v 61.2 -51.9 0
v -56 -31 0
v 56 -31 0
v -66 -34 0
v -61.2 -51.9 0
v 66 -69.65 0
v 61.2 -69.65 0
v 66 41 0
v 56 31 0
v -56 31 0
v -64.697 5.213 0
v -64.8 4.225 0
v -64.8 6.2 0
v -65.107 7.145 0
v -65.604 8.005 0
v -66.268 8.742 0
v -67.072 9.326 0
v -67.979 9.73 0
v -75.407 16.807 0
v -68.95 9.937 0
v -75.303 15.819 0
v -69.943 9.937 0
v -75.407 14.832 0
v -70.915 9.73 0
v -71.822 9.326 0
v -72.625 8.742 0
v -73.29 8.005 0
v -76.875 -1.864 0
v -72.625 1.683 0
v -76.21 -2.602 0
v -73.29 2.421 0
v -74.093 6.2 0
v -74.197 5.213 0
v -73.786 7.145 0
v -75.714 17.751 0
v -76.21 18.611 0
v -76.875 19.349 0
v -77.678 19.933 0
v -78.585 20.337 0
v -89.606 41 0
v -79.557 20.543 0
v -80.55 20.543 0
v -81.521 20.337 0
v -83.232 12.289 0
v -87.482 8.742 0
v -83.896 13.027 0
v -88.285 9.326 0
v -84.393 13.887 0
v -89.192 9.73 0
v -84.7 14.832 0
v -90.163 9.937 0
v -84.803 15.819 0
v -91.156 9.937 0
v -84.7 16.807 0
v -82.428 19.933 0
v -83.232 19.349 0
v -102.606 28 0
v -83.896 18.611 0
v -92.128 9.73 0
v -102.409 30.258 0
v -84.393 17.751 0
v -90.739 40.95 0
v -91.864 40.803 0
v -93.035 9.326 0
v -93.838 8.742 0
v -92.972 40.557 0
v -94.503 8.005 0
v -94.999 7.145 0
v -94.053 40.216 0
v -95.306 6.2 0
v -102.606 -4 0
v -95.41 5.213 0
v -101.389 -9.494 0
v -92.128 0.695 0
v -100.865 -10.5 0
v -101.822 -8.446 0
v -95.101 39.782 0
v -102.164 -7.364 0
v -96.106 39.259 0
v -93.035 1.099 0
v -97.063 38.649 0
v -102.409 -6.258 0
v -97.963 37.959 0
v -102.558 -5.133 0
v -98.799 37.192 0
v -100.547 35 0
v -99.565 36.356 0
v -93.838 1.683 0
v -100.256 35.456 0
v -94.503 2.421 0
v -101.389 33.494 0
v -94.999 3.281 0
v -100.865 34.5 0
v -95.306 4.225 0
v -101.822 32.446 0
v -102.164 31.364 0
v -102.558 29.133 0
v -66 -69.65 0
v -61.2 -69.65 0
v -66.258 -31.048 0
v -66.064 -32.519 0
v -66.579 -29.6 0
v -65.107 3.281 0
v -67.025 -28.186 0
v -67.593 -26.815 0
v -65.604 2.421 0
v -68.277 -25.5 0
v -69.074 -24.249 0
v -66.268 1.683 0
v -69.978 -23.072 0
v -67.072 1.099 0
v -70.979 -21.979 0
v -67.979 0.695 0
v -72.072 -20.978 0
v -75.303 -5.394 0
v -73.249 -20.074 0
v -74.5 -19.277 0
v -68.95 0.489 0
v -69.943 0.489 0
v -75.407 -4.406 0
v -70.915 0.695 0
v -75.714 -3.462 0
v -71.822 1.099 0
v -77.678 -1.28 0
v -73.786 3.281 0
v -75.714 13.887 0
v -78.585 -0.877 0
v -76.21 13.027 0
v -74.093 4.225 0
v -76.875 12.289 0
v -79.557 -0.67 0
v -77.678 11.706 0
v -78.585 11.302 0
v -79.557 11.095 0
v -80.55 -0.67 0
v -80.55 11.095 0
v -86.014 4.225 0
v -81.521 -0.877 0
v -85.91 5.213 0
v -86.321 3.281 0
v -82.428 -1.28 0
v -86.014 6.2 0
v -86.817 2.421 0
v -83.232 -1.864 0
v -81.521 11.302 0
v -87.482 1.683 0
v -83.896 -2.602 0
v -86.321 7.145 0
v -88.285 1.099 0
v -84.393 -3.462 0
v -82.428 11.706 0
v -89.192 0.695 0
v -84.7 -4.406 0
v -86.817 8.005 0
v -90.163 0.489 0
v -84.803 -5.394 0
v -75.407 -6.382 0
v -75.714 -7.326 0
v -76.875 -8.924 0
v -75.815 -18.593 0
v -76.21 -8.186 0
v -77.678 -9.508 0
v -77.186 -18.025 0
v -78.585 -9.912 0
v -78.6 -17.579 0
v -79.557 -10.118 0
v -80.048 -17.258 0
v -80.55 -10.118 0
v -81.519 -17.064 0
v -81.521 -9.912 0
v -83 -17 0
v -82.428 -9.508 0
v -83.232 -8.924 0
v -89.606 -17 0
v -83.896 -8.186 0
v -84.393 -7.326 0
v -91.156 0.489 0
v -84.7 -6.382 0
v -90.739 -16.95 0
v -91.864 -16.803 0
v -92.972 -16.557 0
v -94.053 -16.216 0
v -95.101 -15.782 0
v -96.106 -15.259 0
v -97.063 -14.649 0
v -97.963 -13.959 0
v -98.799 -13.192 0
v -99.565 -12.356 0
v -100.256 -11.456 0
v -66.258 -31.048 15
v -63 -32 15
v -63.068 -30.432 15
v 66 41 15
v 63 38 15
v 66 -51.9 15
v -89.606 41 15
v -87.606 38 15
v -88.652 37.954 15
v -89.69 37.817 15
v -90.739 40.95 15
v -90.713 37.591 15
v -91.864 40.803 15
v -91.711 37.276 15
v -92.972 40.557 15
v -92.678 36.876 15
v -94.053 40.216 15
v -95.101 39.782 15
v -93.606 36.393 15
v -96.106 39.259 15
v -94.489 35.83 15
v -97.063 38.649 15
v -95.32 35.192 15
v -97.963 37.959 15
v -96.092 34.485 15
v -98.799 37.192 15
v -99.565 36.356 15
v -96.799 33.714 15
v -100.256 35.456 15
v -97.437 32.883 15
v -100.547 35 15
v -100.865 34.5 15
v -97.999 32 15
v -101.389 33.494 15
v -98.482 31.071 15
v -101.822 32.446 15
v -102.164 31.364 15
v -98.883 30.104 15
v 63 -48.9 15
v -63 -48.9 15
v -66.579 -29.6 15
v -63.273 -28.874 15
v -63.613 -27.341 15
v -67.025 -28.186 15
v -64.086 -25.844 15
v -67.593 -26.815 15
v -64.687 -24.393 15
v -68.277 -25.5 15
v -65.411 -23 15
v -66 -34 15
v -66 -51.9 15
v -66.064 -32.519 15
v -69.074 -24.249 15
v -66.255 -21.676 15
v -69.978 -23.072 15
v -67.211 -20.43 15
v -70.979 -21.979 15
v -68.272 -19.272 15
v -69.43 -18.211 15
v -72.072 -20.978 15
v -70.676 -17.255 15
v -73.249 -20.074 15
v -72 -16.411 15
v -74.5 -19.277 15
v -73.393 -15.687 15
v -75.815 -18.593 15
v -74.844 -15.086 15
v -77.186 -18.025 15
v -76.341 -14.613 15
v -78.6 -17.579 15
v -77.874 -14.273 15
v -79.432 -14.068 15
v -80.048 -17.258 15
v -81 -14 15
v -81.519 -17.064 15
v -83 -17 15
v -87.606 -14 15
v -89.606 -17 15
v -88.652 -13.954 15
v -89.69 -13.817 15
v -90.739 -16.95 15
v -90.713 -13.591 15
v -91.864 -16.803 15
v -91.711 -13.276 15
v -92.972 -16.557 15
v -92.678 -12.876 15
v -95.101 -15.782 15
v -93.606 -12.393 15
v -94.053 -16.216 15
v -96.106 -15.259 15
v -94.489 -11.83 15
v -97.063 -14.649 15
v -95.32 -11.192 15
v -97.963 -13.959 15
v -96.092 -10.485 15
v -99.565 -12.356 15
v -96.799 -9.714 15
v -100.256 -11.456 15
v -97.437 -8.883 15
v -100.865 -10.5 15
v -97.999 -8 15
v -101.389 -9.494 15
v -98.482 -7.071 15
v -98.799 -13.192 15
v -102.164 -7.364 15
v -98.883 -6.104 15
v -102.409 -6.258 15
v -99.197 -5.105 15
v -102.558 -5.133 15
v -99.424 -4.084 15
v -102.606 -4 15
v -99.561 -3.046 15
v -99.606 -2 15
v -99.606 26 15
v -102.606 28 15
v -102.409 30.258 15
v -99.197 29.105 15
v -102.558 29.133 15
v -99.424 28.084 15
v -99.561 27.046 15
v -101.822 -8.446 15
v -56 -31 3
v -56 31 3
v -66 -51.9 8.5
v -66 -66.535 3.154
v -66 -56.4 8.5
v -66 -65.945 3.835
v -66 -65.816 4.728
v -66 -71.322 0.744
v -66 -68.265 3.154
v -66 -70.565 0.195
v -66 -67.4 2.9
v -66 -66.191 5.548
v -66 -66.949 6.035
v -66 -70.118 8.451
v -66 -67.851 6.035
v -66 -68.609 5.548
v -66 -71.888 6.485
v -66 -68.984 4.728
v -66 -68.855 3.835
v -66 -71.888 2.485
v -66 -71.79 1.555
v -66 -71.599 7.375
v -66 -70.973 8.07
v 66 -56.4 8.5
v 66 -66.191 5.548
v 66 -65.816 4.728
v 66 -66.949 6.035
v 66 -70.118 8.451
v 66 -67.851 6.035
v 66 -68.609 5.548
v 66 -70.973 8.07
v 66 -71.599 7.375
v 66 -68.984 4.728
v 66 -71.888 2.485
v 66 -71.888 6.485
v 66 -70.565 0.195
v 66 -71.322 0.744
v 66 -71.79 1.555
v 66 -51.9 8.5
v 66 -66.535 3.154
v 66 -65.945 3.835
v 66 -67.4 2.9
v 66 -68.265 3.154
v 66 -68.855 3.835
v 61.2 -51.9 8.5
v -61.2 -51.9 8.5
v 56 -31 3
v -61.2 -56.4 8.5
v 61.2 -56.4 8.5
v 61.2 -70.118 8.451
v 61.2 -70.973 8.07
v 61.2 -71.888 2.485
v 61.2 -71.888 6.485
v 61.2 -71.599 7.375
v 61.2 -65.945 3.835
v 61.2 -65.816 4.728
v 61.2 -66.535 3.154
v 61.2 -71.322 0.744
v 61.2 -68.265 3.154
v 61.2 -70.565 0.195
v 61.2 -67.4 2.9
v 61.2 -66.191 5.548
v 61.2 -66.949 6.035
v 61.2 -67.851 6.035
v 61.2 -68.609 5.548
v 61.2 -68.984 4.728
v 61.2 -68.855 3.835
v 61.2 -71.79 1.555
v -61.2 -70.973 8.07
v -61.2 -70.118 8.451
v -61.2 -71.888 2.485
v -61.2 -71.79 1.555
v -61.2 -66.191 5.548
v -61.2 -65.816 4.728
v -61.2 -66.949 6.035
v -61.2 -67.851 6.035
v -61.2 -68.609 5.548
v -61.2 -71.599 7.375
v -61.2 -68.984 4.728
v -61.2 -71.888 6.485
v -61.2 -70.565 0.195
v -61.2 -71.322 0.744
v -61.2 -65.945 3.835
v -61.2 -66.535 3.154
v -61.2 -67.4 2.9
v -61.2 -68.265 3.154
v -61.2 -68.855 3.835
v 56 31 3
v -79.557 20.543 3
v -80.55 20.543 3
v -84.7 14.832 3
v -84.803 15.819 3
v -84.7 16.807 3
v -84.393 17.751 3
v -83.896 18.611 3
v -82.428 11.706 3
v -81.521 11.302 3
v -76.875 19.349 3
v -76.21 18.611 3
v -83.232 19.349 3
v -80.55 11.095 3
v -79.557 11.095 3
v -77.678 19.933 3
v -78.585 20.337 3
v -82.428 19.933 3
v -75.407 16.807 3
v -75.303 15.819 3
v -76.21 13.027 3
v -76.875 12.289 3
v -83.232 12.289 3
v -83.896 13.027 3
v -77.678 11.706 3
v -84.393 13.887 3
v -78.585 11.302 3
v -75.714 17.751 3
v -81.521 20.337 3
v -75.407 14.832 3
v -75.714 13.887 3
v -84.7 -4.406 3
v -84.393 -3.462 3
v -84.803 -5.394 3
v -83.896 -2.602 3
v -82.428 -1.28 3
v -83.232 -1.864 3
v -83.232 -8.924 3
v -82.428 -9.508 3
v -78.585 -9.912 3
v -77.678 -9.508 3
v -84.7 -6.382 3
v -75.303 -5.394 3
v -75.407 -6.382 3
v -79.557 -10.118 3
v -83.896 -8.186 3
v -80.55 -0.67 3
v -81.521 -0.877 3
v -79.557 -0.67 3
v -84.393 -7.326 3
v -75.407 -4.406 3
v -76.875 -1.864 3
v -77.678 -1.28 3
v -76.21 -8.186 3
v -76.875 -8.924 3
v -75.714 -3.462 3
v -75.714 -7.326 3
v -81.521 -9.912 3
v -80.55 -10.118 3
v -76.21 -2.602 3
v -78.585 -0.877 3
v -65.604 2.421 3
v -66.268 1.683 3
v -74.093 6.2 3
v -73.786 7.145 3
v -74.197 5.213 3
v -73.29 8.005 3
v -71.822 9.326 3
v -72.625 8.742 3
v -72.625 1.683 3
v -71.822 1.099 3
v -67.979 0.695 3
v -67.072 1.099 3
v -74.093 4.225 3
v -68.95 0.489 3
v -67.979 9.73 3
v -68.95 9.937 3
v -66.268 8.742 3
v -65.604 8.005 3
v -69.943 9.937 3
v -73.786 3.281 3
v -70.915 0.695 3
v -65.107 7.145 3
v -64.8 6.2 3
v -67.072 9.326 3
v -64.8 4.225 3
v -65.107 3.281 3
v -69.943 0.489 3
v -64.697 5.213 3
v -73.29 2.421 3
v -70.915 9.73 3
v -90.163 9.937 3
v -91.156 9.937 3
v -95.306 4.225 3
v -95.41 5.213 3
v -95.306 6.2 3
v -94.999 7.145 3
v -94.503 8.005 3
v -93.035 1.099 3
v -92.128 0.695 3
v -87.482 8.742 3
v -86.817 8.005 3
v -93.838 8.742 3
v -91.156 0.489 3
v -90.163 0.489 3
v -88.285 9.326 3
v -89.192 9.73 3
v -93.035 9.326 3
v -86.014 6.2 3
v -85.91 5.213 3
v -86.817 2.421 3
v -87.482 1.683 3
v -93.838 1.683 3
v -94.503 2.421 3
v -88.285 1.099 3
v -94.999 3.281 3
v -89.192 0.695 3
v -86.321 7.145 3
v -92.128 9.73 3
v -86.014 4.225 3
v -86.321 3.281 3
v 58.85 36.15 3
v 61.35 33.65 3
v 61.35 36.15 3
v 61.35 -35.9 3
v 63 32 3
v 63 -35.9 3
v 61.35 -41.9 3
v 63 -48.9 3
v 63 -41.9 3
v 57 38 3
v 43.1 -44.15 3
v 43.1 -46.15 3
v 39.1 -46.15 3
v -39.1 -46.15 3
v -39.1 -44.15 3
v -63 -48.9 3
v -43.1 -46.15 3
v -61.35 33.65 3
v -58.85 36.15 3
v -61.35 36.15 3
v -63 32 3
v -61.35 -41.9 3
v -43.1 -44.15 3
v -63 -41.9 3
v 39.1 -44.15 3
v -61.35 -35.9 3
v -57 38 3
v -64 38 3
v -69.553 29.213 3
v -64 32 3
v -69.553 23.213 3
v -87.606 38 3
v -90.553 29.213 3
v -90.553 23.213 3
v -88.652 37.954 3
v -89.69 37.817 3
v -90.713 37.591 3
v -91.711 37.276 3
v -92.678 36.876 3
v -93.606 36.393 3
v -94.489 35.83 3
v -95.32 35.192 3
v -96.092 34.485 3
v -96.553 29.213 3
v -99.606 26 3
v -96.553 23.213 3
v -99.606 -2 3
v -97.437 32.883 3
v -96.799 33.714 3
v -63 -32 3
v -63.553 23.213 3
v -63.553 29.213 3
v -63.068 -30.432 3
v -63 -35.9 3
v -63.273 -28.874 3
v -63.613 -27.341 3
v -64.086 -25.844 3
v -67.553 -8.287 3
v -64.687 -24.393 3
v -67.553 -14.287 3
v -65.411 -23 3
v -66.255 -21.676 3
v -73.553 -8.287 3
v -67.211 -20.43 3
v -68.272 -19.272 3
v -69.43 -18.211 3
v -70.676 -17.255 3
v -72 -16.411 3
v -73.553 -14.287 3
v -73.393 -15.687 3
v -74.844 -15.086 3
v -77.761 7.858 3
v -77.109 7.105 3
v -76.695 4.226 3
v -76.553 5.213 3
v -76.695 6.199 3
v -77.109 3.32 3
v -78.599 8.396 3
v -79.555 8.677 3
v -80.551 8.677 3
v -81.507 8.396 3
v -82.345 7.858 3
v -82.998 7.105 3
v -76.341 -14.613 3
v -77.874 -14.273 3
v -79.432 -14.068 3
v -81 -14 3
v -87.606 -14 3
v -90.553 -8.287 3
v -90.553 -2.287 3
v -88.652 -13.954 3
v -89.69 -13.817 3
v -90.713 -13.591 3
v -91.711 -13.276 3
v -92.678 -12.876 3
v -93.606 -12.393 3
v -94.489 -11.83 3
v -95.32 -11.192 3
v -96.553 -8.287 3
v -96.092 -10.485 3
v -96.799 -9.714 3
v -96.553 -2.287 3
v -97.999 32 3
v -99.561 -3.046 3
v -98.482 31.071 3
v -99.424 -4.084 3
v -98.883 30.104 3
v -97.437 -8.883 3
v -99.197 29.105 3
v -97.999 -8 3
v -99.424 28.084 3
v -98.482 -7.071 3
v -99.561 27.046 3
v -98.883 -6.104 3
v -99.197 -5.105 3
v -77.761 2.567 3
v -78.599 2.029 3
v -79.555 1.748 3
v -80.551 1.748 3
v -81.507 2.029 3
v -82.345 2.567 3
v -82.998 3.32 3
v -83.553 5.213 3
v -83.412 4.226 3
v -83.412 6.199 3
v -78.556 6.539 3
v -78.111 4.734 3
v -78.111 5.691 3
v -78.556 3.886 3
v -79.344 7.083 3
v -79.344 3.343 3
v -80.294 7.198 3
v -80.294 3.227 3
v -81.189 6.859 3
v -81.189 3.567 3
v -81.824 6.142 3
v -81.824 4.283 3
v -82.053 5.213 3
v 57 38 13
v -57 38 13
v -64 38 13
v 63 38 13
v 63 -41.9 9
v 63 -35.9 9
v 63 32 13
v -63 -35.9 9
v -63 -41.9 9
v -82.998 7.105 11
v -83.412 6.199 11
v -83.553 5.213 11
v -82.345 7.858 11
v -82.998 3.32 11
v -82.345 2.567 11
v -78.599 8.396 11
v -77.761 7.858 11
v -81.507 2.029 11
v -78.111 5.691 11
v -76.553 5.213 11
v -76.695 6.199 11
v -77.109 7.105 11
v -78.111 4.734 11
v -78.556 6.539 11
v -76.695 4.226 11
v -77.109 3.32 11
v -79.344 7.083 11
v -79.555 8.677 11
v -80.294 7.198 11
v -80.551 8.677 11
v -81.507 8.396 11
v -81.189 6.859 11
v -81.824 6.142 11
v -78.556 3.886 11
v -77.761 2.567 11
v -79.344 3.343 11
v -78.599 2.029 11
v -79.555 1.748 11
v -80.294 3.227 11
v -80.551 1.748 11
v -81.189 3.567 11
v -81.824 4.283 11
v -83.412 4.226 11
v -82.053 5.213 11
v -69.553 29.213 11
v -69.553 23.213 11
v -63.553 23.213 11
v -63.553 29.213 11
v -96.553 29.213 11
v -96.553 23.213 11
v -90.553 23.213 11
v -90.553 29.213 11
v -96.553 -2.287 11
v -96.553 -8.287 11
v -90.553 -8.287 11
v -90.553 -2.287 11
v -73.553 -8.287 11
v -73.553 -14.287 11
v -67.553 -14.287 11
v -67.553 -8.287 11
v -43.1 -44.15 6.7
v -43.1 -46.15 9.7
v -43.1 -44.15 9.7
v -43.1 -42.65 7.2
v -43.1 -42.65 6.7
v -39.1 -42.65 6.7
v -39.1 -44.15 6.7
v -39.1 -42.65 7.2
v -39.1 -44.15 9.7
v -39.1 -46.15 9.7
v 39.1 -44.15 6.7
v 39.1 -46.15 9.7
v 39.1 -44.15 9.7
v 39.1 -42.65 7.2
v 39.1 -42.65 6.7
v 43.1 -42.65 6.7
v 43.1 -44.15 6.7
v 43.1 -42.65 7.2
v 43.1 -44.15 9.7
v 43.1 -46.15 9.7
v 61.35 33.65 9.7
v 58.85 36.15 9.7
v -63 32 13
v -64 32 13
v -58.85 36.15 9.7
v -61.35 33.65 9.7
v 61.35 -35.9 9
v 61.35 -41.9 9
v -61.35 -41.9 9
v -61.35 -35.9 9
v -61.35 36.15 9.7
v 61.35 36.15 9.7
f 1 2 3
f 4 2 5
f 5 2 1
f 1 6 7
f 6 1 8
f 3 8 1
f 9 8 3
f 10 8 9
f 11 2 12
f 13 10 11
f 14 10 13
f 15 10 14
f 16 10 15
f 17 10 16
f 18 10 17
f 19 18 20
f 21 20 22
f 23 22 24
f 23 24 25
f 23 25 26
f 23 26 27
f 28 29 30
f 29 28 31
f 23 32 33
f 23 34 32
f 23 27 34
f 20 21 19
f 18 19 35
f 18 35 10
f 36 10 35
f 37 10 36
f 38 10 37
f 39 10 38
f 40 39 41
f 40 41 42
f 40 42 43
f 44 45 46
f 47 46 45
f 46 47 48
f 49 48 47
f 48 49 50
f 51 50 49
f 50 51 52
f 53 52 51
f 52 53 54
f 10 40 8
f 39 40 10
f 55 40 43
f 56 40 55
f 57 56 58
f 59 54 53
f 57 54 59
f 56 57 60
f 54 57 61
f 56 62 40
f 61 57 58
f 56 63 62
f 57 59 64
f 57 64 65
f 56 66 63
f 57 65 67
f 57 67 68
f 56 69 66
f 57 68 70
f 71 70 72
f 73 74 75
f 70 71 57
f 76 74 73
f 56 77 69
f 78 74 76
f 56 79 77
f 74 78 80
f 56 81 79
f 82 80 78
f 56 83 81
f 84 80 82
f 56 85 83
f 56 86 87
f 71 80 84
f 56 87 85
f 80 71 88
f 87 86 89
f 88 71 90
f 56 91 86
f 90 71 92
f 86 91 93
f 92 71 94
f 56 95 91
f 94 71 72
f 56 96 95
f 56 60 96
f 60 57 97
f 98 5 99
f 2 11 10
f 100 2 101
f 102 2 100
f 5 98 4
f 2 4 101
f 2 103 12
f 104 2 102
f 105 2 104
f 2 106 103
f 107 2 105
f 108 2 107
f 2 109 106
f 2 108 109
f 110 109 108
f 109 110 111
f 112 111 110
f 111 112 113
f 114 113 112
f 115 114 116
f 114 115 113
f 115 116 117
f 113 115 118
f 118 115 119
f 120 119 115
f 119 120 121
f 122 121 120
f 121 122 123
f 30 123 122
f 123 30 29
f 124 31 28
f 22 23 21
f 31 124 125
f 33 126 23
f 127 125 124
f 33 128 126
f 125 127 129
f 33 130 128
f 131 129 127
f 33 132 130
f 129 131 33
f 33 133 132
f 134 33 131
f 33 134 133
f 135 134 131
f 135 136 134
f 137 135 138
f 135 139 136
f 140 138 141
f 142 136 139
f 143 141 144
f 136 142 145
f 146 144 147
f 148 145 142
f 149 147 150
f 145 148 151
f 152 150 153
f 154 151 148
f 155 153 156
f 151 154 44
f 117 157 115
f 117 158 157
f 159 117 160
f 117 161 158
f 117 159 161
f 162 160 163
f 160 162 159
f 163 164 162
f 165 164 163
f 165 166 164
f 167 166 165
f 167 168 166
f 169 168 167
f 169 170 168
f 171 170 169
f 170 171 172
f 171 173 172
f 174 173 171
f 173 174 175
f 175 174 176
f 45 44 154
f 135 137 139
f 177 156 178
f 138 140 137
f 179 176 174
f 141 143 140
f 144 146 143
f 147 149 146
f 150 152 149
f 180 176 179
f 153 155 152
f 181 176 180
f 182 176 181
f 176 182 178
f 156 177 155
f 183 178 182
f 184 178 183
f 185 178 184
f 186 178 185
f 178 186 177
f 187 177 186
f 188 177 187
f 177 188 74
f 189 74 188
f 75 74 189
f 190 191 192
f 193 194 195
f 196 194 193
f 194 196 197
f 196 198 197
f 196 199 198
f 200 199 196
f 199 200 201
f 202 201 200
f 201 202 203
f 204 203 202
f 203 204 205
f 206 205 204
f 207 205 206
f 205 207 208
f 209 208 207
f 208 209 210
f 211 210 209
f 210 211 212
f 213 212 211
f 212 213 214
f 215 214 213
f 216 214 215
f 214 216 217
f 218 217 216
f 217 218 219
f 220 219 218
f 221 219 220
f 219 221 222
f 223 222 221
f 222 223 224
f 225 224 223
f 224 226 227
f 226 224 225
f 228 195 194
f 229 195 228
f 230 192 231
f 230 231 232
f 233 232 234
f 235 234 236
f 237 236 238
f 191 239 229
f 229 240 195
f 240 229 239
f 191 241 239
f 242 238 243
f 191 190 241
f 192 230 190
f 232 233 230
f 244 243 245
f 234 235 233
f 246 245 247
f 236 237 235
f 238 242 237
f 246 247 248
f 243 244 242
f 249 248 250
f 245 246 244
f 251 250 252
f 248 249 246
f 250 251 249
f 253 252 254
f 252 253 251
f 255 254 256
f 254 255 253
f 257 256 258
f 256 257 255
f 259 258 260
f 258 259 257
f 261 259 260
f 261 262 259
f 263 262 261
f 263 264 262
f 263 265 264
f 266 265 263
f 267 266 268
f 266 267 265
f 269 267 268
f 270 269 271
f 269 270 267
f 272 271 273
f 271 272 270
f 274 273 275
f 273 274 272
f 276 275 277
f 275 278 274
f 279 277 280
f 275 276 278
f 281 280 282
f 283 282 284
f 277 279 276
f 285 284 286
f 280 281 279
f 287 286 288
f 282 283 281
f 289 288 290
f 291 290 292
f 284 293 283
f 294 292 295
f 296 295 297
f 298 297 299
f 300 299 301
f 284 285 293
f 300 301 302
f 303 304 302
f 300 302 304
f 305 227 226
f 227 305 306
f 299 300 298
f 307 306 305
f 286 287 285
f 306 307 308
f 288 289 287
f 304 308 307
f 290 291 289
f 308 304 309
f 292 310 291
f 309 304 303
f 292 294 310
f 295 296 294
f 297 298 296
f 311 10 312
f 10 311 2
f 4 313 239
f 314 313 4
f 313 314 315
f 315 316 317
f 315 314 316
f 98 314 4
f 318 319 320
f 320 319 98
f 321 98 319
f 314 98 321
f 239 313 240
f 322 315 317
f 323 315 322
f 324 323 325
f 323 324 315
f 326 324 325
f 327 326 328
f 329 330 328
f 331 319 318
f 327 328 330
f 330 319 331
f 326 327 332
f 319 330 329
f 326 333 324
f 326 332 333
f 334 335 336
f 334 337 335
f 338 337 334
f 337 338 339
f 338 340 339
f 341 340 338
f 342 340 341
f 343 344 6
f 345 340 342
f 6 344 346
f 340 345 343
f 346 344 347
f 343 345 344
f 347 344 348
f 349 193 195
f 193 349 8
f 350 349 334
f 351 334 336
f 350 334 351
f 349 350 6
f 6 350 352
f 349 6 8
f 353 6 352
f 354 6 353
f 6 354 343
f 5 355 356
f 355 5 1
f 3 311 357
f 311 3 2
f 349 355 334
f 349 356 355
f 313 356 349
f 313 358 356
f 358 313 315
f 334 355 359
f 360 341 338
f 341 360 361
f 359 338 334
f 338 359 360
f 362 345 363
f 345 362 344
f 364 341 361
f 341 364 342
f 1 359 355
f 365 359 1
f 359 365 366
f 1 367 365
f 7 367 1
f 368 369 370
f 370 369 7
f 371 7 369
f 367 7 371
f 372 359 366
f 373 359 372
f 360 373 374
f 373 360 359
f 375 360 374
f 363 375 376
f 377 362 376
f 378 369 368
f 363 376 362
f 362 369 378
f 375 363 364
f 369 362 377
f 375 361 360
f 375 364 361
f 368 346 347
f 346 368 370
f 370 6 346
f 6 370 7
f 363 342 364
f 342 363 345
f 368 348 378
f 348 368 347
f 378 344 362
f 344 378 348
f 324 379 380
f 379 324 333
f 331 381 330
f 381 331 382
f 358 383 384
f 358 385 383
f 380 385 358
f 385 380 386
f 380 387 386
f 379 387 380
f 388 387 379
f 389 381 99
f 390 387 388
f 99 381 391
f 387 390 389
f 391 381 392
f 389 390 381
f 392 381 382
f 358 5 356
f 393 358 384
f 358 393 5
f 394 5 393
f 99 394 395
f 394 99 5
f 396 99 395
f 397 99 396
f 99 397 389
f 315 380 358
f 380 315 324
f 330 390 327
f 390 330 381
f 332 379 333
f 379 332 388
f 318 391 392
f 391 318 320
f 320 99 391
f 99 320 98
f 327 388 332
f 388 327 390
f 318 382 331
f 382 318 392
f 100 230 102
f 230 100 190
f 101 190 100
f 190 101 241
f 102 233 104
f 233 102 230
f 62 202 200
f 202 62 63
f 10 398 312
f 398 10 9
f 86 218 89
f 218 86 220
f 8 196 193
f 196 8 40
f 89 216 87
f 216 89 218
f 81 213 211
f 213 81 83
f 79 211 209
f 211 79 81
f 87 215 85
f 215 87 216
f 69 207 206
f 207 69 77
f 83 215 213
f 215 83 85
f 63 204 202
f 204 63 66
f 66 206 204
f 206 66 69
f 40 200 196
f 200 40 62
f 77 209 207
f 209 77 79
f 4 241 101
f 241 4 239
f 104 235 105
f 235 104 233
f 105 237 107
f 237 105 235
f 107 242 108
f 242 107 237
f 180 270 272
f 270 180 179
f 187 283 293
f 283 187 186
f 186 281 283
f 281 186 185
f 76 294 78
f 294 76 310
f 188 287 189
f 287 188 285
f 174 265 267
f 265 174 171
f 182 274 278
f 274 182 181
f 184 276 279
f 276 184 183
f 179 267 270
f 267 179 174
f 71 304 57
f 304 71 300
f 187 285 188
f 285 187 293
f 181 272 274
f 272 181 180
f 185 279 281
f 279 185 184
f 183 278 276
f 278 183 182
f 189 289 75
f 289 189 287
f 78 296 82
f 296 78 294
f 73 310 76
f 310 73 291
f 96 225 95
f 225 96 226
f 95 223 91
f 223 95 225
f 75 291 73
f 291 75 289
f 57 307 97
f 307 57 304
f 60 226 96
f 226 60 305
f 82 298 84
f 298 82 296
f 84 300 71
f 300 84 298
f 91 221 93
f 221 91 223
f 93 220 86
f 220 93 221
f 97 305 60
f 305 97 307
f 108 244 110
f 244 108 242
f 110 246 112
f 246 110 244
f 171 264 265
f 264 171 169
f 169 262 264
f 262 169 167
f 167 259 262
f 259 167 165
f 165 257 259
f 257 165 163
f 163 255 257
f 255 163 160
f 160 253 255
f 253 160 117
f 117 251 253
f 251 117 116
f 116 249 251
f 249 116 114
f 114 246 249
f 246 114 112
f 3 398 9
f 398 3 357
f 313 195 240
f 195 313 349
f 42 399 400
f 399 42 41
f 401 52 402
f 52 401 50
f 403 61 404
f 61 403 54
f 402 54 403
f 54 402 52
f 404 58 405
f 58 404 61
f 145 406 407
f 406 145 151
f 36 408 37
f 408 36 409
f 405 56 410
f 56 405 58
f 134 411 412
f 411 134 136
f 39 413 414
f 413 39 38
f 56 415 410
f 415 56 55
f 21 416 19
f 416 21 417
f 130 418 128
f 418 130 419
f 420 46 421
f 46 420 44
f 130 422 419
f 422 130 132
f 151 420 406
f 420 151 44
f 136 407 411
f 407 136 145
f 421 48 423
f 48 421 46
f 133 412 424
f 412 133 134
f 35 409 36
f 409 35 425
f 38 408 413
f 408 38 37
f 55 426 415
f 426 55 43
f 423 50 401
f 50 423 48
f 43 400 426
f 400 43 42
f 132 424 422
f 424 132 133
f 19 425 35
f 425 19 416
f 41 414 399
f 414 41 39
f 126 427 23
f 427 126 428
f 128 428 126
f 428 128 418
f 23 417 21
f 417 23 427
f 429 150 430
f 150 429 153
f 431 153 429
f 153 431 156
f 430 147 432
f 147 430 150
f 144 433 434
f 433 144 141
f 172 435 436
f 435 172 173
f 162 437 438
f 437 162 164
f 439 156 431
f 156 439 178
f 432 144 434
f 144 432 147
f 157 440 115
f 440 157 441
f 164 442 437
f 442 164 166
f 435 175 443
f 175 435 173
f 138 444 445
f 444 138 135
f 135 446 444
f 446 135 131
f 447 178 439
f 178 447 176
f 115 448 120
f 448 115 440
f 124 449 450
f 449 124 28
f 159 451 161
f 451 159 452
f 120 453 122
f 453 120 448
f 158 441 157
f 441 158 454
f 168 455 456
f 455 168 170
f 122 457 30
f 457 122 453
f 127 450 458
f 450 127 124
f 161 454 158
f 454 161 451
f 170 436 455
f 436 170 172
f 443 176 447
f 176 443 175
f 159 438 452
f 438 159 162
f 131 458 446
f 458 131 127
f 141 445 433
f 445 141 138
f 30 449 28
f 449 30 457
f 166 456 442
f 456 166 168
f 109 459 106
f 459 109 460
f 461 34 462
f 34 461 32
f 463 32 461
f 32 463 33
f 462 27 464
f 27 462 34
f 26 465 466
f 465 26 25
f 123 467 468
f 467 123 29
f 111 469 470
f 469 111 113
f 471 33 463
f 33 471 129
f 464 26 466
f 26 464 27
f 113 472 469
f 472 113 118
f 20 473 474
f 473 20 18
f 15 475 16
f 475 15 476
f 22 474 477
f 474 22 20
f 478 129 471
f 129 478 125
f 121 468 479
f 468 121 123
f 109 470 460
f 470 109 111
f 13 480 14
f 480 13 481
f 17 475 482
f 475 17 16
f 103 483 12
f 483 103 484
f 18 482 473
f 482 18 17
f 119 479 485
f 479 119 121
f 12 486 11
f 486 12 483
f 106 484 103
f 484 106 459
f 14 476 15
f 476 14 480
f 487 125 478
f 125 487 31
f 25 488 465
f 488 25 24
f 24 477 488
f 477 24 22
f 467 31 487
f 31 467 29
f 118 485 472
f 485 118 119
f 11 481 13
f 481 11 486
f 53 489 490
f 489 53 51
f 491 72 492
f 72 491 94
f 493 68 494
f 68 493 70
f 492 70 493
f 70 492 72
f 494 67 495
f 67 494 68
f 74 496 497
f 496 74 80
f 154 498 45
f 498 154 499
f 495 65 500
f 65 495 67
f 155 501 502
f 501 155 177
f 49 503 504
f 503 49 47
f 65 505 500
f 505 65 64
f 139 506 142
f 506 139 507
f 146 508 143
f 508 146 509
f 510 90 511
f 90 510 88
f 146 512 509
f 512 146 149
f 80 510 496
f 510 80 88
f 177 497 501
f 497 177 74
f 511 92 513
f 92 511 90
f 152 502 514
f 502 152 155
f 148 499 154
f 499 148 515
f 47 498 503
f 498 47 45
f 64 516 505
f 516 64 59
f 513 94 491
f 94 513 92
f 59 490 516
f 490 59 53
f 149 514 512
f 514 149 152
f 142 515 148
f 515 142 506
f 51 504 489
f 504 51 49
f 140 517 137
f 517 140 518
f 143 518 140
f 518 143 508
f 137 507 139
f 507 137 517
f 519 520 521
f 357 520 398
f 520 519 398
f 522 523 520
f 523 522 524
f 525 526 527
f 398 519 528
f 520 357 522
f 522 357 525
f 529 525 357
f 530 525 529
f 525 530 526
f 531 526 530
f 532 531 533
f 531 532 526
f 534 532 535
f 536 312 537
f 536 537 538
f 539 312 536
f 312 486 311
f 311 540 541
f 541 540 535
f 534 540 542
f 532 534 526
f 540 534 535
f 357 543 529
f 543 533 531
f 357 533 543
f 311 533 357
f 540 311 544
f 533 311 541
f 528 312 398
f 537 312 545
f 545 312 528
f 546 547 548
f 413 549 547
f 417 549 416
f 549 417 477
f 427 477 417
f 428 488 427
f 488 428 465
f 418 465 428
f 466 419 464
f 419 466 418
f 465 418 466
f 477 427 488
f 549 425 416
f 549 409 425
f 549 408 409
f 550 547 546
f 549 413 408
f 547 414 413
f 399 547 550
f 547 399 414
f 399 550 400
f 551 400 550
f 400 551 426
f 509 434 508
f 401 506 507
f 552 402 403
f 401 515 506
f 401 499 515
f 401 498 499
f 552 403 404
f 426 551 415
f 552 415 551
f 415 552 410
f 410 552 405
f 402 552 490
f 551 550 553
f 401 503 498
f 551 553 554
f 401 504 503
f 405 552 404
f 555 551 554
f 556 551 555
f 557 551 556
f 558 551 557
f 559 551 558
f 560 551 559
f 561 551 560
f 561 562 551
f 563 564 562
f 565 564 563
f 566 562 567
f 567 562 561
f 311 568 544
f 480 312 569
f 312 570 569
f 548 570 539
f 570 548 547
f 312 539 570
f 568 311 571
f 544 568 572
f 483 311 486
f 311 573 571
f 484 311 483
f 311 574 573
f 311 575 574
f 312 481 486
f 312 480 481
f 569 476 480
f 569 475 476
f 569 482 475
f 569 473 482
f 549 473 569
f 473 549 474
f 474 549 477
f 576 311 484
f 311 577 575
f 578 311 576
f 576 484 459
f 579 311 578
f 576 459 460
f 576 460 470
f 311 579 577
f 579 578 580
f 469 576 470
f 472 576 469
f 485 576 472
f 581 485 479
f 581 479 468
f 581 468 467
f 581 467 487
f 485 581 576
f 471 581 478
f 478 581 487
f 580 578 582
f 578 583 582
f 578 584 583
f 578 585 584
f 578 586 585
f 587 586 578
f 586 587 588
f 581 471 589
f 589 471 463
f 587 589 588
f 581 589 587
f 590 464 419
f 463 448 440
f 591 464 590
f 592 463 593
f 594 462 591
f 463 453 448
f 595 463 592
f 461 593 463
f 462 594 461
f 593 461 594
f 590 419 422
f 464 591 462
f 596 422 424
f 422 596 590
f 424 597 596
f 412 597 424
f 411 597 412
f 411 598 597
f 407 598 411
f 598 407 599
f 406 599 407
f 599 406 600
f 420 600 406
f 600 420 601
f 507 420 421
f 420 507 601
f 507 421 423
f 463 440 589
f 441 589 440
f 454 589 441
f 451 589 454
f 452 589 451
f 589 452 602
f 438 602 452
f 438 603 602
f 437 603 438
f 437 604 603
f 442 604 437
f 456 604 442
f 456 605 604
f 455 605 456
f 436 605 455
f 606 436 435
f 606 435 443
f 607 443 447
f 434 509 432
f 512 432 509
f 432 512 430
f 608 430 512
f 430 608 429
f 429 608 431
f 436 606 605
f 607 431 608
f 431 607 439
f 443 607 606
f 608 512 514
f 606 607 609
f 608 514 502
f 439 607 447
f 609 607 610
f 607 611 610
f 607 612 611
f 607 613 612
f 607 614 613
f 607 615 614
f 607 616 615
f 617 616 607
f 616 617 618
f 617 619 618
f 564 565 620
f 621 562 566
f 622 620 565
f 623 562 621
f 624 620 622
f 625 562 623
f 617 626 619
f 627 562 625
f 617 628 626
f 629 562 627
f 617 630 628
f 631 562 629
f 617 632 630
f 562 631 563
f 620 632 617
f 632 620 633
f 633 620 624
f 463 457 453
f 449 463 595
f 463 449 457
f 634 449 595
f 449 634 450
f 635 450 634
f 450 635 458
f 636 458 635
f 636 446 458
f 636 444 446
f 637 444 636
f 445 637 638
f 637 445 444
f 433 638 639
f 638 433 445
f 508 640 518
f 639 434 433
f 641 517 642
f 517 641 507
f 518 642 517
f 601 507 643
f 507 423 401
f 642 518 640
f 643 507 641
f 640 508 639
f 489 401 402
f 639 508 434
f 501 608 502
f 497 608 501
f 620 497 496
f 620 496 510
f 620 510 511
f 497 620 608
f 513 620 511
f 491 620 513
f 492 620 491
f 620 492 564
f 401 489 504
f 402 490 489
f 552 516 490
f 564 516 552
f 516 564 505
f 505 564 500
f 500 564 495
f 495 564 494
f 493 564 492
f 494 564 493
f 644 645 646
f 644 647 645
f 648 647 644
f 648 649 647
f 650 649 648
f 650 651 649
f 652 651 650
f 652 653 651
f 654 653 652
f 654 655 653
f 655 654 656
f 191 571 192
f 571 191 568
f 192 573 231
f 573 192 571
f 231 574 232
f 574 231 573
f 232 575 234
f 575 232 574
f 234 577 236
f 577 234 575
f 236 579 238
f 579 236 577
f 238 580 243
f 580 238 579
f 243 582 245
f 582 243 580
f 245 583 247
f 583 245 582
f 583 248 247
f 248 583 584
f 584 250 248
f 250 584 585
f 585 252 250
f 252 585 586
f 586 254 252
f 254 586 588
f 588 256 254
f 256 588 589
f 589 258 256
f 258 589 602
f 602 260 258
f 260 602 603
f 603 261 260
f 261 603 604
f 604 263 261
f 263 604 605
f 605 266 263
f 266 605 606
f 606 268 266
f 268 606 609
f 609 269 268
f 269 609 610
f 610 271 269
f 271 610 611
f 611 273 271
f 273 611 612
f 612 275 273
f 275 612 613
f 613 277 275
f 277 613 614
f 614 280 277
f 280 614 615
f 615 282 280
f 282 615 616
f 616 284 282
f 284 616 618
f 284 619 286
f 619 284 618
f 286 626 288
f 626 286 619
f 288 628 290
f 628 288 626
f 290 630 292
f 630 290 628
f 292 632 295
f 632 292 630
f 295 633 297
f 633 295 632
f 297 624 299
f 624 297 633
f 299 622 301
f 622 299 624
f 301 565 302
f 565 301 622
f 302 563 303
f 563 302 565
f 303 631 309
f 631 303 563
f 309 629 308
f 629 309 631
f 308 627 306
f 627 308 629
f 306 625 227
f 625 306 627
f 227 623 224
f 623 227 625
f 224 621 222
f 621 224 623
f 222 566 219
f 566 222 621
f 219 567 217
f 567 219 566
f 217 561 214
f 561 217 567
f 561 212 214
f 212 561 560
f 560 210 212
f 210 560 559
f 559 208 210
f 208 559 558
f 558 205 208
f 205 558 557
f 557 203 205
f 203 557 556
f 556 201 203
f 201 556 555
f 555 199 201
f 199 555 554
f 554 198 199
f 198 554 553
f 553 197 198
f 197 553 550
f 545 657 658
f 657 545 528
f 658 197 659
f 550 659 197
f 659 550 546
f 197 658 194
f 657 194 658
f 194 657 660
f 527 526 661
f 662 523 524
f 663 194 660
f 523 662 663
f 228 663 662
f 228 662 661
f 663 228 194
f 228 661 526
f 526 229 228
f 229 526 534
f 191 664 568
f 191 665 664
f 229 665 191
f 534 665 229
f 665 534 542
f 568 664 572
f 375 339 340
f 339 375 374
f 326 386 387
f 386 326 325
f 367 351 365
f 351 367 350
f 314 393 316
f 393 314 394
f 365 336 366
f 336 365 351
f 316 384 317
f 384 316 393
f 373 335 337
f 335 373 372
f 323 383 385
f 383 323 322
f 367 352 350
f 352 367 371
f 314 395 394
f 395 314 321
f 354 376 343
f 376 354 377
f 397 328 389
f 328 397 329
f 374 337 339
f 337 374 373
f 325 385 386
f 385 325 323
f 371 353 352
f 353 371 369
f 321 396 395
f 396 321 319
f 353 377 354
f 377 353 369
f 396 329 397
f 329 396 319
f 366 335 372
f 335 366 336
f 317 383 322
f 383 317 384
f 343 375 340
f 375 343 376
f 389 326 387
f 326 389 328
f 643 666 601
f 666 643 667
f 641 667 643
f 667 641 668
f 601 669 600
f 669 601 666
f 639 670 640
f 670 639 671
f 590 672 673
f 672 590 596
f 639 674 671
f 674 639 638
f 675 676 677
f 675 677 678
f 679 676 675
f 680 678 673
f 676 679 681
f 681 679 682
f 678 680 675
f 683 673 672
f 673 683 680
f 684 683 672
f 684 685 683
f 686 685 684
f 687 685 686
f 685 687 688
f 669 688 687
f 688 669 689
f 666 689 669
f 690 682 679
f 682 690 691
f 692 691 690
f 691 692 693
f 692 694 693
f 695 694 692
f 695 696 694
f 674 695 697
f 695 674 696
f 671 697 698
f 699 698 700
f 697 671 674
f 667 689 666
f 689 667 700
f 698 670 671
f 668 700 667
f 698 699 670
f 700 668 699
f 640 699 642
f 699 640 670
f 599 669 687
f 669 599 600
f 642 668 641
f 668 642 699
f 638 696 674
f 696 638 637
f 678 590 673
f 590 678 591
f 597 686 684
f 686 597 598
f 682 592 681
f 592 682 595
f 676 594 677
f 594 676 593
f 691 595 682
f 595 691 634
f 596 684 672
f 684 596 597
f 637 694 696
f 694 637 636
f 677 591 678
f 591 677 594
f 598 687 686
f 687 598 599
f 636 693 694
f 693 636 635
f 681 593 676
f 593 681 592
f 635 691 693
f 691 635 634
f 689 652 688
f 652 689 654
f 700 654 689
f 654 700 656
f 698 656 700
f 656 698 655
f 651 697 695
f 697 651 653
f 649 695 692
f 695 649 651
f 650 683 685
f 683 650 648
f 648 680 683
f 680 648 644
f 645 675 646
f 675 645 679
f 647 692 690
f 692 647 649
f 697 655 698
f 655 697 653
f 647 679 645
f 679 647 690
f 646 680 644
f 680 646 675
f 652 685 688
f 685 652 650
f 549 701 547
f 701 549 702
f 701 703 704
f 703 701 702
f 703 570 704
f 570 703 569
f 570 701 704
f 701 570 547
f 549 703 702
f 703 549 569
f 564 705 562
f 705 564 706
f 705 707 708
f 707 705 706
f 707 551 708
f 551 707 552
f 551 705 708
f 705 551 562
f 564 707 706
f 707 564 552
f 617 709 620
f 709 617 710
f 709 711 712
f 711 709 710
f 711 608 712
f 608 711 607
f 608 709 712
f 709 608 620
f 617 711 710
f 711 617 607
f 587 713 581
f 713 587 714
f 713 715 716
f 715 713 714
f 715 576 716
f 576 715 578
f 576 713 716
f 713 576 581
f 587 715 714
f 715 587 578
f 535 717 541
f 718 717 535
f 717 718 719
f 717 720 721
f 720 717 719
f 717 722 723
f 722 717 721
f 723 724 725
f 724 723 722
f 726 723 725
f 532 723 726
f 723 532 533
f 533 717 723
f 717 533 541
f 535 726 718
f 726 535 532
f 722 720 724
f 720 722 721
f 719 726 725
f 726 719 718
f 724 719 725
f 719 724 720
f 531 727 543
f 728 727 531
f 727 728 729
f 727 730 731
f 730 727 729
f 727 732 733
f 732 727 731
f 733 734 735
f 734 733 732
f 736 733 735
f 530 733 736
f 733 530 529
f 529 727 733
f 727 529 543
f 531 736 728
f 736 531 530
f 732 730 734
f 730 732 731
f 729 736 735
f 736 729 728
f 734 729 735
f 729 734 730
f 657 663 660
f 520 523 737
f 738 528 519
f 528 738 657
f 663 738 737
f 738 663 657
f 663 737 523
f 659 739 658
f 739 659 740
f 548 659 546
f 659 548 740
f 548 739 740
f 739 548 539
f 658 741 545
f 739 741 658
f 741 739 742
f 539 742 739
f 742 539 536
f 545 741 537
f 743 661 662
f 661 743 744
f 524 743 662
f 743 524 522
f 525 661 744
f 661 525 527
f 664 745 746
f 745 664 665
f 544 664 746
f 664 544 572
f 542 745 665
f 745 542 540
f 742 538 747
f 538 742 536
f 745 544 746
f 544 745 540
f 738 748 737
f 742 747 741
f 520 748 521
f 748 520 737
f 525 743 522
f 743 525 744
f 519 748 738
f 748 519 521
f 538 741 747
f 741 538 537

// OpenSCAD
//$fn = 50;
$fa = 5;
$fs = 1;

fa_small = 6;
fs_small = 0.2;

module plot(h = 6, d1 = 4, d2 = 6) {
	difference() {
		cylinder(h = h, d = d2);
		translate([0,0,-1]) cylinder(h = h + 2, d = d1);
	}
}

module support_lcd(l = 6, h = 10) {
    translate([-1,-1,0]) cube([1, l+1, h]);
    translate([-1,-1,0]) cube([l+1, 1, h]);
    linear_extrude(height=h) polygon(points = [
	[0,0],
	[0, l],
	[l, 0],
	]);
}

module clip_top(l, e) {
	translate([l, 0, 0]) rotate([0, -90, 0])
	    linear_extrude(height=l) polygon(points = [
	        [0, 0],
	        [0, e+1.5],
	        [0.5, e+1.5],
	        [3, e],
	        [3, 0]
	    ]);
}

module clip(b=0, h=3, l=4, e=3) {
	translate([-l/2, -e, 0]) {
	    translate([0, e+0.5, 0]) cube([l, 3, b]);
	    cube([l, e, h+b]);
	    translate([0, 0, b+h]) clip_top(l=l, e=e);
	}
}

module buttons(d = 9.5) {
	translate([0, 10.60660172, 0]) cylinder(d = d, h = 5);
	translate([0, -10.60660172, 0]) cylinder(d = d, h = 5);
	translate([-10.60660172, 0, 0]) cylinder(d = d, h = 5);
	translate([10.60660172, 0, 0]) cylinder(d = d, h = 5);
}

module buttons_support(h = 8) {
    plot(h = h, d1 = 4, d2 = 7);
    translate([-16.5,18,0]) cube([6,6,h]);
    translate([10.5,18,0]) cube([6,6,h]);
    translate([10.5,-13.5,0]) cube([6,6,h]);
    translate([-12.5,-19.5,0]) cube([6,6,h]);
}

module cubeandcyl(l = 4.5, h = 11) {
    translate([0, 91/2, h / 2]) cube([103 * 2, 91, h], center = true);
    translate([0, 0, l/2]) hull() {
 	translate([0, -l/2, 0]) cube([132, l, l], center = true);
	translate([0, -20 + l/2, 0]) rotate([0, 90, 0]) cylinder(d = l, h = 132, center = true);
    }
}

module base(h = 20) {
    intersection() {
	linear_extrude(height = h)
	    import(file="display.dxf", layer="extrude");
        translate([0, -49.9, 0]) cubeandcyl(l = 4.5, h = h);
    }
}

module base_m(h = 15) {
	minkowski() {
		translate([0,0,2]) base(h - 4);
		//sphere(r = 2, $fa = fa_small, $fs = fs_small);
		cube([4,4,4], center=true);

	}
}

mirror([1,0,0]) {
    difference() {
    	base_m();
    	translate([0,0,3]) linear_extrude(height = 20)
    	    import(file="display.dxf", layer="hidden");
    	translate([80.05330086, 5.21254627, 0]) buttons();
    	translate([0, -71.9 + 4.5, 4.5]) rotate([0,90,0]) cylinder(d = 3.2, h = 132, center = true);
    }

    translate([80.05330086, 5.21254627, 3]) buttons_support(h = 8);

    // clips for LCD
    translate([41.1,  -43.9 - 0.25, 0]) clip(b = 0, h=6.7, e = 2);
    translate([-41.1,  -43.9 - 0.25, 0]) clip(b = 0, h=6.7, e = 2);

    difference() {
        union() {
    	// add plots for LCD
    	translate([-63, 38, 3]) rotate([0,0,-90]) support_lcd(l = 6, h = 10);
    	translate([63, 38, 3]) rotate([0,0,-180]) support_lcd(l = 6, h = 10);
    	translate([-61.1, -43.9 + 5, 3 + 3]) cube([6, 6, 6], center = true);
    	translate([61.1, -43.9 + 5, 3 + 3]) cube([6, 6, 6], center = true);
        }
        // the LCD itself
        translate([0, -4, 6.7 / 2 + 3]) cube([122.2 + 0.5, 79.8 + 0.5, 6.7], center = true);
    }
}
